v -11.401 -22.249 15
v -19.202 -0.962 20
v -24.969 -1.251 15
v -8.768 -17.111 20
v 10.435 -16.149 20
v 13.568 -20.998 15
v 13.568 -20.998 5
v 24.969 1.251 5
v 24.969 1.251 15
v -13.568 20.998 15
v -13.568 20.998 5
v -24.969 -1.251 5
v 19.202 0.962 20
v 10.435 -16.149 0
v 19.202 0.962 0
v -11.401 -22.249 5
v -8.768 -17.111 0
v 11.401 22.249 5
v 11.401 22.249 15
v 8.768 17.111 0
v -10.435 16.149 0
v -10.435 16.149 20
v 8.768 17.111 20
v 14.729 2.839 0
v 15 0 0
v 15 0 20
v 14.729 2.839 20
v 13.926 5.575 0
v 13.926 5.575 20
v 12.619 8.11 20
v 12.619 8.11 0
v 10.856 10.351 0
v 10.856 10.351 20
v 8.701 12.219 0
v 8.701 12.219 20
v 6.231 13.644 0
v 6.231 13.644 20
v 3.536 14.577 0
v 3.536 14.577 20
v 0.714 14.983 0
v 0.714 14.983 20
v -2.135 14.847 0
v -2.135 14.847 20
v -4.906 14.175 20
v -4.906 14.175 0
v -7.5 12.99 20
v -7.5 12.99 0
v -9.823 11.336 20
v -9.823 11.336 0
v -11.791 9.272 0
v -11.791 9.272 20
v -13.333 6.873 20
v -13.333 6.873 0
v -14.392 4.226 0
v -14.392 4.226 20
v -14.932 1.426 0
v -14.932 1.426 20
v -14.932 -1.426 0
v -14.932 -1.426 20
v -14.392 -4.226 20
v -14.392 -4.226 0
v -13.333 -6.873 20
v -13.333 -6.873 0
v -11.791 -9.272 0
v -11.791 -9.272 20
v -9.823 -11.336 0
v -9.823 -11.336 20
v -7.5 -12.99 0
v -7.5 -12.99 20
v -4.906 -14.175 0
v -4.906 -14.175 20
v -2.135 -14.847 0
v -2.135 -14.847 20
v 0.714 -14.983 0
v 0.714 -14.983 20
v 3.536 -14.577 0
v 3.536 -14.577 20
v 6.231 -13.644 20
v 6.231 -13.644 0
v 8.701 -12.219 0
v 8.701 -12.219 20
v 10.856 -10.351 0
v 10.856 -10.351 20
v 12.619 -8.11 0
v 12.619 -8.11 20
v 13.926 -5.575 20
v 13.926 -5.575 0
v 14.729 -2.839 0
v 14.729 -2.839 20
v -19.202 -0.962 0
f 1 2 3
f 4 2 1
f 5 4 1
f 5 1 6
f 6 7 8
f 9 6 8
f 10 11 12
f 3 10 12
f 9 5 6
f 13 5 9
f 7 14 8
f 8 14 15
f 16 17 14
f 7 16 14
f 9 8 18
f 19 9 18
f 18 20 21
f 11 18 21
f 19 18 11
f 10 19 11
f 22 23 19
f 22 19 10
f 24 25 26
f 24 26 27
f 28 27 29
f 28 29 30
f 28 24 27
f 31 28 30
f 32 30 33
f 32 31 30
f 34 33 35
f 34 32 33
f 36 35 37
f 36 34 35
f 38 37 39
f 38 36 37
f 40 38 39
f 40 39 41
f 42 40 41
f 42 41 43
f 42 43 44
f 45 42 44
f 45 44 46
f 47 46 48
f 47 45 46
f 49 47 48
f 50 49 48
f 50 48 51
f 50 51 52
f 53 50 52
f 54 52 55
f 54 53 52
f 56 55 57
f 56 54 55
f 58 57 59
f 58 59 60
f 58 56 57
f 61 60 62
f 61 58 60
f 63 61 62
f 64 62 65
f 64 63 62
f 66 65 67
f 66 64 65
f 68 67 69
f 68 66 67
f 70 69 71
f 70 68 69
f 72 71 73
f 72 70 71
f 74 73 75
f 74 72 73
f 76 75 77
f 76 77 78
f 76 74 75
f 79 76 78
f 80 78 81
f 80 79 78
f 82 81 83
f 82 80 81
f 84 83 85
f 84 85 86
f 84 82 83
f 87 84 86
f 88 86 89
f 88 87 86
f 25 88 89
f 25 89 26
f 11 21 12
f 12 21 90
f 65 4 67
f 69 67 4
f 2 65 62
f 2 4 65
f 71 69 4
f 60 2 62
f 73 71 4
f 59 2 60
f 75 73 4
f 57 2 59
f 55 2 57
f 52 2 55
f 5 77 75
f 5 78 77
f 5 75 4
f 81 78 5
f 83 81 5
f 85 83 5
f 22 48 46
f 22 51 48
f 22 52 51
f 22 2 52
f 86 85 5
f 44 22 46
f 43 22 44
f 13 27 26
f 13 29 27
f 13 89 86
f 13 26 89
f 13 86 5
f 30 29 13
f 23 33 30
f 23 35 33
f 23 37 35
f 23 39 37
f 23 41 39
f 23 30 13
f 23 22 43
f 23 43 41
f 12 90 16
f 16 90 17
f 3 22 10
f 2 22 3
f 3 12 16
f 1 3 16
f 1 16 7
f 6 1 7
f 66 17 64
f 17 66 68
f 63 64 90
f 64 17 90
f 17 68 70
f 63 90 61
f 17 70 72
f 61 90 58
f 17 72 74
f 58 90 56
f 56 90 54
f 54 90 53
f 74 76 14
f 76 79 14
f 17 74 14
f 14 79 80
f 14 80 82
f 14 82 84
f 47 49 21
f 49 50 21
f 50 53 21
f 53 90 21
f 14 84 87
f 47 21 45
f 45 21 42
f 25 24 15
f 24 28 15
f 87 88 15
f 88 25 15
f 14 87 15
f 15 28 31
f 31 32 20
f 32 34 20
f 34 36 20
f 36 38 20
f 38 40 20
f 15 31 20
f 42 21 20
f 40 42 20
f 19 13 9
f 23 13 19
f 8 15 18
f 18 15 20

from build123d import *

# Parameters (mm, degrees)
F0_R     = 15
F1_DEPTH = 20
F2_R     = 15
F3_DEPTH = 33.7
F4_SIZE  = 5


with BuildPart() as f1:
    # F0 (on Top) → F1 (new body)
    with BuildSketch(Plane.XY):
        Circle(F0_R)
        Polygon((-11.400712, -22.249129), (13.567955, -20.997871), (24.968667, 1.251258), (11.400712, 22.249129), (-13.567955, 20.997871), (-24.968667, -1.251258), align=None)
        Circle(F0_R, mode=Mode.SUBTRACT)
    extrude(amount=F1_DEPTH)

    # F2 (on face) → F3 (cut)
    with BuildSketch(Plane(origin=(0, 0, 0), x_dir=(1, 0, 0), z_dir=(0, 0, -1))):
        Circle(F2_R)
    extrude(amount=-F3_DEPTH, mode=Mode.SUBTRACT)

    # F4
    f4_edges = [f1.edges().sort_by_distance(p)[0] for p in [
        (1.083621, -21.6235, 20),
        (1.083621, -21.6235, 0),
        (-18.18469, -11.750194, 0),
        (-18.18469, -11.750194, 20),
        (-19.268311, 9.873307, 0),
        (-19.268311, 9.873307, 20),
        (-1.083621, 21.6235, 20),
        (-1.083621, 21.6235, 0),
        (18.18469, 11.750194, 0),
        (18.18469, 11.750194, 20),
        (19.268311, -9.873307, 20),
        (19.268311, -9.873307, 0),
    ]]
    chamfer(f4_edges, length=F4_SIZE)


solid = f1.part
